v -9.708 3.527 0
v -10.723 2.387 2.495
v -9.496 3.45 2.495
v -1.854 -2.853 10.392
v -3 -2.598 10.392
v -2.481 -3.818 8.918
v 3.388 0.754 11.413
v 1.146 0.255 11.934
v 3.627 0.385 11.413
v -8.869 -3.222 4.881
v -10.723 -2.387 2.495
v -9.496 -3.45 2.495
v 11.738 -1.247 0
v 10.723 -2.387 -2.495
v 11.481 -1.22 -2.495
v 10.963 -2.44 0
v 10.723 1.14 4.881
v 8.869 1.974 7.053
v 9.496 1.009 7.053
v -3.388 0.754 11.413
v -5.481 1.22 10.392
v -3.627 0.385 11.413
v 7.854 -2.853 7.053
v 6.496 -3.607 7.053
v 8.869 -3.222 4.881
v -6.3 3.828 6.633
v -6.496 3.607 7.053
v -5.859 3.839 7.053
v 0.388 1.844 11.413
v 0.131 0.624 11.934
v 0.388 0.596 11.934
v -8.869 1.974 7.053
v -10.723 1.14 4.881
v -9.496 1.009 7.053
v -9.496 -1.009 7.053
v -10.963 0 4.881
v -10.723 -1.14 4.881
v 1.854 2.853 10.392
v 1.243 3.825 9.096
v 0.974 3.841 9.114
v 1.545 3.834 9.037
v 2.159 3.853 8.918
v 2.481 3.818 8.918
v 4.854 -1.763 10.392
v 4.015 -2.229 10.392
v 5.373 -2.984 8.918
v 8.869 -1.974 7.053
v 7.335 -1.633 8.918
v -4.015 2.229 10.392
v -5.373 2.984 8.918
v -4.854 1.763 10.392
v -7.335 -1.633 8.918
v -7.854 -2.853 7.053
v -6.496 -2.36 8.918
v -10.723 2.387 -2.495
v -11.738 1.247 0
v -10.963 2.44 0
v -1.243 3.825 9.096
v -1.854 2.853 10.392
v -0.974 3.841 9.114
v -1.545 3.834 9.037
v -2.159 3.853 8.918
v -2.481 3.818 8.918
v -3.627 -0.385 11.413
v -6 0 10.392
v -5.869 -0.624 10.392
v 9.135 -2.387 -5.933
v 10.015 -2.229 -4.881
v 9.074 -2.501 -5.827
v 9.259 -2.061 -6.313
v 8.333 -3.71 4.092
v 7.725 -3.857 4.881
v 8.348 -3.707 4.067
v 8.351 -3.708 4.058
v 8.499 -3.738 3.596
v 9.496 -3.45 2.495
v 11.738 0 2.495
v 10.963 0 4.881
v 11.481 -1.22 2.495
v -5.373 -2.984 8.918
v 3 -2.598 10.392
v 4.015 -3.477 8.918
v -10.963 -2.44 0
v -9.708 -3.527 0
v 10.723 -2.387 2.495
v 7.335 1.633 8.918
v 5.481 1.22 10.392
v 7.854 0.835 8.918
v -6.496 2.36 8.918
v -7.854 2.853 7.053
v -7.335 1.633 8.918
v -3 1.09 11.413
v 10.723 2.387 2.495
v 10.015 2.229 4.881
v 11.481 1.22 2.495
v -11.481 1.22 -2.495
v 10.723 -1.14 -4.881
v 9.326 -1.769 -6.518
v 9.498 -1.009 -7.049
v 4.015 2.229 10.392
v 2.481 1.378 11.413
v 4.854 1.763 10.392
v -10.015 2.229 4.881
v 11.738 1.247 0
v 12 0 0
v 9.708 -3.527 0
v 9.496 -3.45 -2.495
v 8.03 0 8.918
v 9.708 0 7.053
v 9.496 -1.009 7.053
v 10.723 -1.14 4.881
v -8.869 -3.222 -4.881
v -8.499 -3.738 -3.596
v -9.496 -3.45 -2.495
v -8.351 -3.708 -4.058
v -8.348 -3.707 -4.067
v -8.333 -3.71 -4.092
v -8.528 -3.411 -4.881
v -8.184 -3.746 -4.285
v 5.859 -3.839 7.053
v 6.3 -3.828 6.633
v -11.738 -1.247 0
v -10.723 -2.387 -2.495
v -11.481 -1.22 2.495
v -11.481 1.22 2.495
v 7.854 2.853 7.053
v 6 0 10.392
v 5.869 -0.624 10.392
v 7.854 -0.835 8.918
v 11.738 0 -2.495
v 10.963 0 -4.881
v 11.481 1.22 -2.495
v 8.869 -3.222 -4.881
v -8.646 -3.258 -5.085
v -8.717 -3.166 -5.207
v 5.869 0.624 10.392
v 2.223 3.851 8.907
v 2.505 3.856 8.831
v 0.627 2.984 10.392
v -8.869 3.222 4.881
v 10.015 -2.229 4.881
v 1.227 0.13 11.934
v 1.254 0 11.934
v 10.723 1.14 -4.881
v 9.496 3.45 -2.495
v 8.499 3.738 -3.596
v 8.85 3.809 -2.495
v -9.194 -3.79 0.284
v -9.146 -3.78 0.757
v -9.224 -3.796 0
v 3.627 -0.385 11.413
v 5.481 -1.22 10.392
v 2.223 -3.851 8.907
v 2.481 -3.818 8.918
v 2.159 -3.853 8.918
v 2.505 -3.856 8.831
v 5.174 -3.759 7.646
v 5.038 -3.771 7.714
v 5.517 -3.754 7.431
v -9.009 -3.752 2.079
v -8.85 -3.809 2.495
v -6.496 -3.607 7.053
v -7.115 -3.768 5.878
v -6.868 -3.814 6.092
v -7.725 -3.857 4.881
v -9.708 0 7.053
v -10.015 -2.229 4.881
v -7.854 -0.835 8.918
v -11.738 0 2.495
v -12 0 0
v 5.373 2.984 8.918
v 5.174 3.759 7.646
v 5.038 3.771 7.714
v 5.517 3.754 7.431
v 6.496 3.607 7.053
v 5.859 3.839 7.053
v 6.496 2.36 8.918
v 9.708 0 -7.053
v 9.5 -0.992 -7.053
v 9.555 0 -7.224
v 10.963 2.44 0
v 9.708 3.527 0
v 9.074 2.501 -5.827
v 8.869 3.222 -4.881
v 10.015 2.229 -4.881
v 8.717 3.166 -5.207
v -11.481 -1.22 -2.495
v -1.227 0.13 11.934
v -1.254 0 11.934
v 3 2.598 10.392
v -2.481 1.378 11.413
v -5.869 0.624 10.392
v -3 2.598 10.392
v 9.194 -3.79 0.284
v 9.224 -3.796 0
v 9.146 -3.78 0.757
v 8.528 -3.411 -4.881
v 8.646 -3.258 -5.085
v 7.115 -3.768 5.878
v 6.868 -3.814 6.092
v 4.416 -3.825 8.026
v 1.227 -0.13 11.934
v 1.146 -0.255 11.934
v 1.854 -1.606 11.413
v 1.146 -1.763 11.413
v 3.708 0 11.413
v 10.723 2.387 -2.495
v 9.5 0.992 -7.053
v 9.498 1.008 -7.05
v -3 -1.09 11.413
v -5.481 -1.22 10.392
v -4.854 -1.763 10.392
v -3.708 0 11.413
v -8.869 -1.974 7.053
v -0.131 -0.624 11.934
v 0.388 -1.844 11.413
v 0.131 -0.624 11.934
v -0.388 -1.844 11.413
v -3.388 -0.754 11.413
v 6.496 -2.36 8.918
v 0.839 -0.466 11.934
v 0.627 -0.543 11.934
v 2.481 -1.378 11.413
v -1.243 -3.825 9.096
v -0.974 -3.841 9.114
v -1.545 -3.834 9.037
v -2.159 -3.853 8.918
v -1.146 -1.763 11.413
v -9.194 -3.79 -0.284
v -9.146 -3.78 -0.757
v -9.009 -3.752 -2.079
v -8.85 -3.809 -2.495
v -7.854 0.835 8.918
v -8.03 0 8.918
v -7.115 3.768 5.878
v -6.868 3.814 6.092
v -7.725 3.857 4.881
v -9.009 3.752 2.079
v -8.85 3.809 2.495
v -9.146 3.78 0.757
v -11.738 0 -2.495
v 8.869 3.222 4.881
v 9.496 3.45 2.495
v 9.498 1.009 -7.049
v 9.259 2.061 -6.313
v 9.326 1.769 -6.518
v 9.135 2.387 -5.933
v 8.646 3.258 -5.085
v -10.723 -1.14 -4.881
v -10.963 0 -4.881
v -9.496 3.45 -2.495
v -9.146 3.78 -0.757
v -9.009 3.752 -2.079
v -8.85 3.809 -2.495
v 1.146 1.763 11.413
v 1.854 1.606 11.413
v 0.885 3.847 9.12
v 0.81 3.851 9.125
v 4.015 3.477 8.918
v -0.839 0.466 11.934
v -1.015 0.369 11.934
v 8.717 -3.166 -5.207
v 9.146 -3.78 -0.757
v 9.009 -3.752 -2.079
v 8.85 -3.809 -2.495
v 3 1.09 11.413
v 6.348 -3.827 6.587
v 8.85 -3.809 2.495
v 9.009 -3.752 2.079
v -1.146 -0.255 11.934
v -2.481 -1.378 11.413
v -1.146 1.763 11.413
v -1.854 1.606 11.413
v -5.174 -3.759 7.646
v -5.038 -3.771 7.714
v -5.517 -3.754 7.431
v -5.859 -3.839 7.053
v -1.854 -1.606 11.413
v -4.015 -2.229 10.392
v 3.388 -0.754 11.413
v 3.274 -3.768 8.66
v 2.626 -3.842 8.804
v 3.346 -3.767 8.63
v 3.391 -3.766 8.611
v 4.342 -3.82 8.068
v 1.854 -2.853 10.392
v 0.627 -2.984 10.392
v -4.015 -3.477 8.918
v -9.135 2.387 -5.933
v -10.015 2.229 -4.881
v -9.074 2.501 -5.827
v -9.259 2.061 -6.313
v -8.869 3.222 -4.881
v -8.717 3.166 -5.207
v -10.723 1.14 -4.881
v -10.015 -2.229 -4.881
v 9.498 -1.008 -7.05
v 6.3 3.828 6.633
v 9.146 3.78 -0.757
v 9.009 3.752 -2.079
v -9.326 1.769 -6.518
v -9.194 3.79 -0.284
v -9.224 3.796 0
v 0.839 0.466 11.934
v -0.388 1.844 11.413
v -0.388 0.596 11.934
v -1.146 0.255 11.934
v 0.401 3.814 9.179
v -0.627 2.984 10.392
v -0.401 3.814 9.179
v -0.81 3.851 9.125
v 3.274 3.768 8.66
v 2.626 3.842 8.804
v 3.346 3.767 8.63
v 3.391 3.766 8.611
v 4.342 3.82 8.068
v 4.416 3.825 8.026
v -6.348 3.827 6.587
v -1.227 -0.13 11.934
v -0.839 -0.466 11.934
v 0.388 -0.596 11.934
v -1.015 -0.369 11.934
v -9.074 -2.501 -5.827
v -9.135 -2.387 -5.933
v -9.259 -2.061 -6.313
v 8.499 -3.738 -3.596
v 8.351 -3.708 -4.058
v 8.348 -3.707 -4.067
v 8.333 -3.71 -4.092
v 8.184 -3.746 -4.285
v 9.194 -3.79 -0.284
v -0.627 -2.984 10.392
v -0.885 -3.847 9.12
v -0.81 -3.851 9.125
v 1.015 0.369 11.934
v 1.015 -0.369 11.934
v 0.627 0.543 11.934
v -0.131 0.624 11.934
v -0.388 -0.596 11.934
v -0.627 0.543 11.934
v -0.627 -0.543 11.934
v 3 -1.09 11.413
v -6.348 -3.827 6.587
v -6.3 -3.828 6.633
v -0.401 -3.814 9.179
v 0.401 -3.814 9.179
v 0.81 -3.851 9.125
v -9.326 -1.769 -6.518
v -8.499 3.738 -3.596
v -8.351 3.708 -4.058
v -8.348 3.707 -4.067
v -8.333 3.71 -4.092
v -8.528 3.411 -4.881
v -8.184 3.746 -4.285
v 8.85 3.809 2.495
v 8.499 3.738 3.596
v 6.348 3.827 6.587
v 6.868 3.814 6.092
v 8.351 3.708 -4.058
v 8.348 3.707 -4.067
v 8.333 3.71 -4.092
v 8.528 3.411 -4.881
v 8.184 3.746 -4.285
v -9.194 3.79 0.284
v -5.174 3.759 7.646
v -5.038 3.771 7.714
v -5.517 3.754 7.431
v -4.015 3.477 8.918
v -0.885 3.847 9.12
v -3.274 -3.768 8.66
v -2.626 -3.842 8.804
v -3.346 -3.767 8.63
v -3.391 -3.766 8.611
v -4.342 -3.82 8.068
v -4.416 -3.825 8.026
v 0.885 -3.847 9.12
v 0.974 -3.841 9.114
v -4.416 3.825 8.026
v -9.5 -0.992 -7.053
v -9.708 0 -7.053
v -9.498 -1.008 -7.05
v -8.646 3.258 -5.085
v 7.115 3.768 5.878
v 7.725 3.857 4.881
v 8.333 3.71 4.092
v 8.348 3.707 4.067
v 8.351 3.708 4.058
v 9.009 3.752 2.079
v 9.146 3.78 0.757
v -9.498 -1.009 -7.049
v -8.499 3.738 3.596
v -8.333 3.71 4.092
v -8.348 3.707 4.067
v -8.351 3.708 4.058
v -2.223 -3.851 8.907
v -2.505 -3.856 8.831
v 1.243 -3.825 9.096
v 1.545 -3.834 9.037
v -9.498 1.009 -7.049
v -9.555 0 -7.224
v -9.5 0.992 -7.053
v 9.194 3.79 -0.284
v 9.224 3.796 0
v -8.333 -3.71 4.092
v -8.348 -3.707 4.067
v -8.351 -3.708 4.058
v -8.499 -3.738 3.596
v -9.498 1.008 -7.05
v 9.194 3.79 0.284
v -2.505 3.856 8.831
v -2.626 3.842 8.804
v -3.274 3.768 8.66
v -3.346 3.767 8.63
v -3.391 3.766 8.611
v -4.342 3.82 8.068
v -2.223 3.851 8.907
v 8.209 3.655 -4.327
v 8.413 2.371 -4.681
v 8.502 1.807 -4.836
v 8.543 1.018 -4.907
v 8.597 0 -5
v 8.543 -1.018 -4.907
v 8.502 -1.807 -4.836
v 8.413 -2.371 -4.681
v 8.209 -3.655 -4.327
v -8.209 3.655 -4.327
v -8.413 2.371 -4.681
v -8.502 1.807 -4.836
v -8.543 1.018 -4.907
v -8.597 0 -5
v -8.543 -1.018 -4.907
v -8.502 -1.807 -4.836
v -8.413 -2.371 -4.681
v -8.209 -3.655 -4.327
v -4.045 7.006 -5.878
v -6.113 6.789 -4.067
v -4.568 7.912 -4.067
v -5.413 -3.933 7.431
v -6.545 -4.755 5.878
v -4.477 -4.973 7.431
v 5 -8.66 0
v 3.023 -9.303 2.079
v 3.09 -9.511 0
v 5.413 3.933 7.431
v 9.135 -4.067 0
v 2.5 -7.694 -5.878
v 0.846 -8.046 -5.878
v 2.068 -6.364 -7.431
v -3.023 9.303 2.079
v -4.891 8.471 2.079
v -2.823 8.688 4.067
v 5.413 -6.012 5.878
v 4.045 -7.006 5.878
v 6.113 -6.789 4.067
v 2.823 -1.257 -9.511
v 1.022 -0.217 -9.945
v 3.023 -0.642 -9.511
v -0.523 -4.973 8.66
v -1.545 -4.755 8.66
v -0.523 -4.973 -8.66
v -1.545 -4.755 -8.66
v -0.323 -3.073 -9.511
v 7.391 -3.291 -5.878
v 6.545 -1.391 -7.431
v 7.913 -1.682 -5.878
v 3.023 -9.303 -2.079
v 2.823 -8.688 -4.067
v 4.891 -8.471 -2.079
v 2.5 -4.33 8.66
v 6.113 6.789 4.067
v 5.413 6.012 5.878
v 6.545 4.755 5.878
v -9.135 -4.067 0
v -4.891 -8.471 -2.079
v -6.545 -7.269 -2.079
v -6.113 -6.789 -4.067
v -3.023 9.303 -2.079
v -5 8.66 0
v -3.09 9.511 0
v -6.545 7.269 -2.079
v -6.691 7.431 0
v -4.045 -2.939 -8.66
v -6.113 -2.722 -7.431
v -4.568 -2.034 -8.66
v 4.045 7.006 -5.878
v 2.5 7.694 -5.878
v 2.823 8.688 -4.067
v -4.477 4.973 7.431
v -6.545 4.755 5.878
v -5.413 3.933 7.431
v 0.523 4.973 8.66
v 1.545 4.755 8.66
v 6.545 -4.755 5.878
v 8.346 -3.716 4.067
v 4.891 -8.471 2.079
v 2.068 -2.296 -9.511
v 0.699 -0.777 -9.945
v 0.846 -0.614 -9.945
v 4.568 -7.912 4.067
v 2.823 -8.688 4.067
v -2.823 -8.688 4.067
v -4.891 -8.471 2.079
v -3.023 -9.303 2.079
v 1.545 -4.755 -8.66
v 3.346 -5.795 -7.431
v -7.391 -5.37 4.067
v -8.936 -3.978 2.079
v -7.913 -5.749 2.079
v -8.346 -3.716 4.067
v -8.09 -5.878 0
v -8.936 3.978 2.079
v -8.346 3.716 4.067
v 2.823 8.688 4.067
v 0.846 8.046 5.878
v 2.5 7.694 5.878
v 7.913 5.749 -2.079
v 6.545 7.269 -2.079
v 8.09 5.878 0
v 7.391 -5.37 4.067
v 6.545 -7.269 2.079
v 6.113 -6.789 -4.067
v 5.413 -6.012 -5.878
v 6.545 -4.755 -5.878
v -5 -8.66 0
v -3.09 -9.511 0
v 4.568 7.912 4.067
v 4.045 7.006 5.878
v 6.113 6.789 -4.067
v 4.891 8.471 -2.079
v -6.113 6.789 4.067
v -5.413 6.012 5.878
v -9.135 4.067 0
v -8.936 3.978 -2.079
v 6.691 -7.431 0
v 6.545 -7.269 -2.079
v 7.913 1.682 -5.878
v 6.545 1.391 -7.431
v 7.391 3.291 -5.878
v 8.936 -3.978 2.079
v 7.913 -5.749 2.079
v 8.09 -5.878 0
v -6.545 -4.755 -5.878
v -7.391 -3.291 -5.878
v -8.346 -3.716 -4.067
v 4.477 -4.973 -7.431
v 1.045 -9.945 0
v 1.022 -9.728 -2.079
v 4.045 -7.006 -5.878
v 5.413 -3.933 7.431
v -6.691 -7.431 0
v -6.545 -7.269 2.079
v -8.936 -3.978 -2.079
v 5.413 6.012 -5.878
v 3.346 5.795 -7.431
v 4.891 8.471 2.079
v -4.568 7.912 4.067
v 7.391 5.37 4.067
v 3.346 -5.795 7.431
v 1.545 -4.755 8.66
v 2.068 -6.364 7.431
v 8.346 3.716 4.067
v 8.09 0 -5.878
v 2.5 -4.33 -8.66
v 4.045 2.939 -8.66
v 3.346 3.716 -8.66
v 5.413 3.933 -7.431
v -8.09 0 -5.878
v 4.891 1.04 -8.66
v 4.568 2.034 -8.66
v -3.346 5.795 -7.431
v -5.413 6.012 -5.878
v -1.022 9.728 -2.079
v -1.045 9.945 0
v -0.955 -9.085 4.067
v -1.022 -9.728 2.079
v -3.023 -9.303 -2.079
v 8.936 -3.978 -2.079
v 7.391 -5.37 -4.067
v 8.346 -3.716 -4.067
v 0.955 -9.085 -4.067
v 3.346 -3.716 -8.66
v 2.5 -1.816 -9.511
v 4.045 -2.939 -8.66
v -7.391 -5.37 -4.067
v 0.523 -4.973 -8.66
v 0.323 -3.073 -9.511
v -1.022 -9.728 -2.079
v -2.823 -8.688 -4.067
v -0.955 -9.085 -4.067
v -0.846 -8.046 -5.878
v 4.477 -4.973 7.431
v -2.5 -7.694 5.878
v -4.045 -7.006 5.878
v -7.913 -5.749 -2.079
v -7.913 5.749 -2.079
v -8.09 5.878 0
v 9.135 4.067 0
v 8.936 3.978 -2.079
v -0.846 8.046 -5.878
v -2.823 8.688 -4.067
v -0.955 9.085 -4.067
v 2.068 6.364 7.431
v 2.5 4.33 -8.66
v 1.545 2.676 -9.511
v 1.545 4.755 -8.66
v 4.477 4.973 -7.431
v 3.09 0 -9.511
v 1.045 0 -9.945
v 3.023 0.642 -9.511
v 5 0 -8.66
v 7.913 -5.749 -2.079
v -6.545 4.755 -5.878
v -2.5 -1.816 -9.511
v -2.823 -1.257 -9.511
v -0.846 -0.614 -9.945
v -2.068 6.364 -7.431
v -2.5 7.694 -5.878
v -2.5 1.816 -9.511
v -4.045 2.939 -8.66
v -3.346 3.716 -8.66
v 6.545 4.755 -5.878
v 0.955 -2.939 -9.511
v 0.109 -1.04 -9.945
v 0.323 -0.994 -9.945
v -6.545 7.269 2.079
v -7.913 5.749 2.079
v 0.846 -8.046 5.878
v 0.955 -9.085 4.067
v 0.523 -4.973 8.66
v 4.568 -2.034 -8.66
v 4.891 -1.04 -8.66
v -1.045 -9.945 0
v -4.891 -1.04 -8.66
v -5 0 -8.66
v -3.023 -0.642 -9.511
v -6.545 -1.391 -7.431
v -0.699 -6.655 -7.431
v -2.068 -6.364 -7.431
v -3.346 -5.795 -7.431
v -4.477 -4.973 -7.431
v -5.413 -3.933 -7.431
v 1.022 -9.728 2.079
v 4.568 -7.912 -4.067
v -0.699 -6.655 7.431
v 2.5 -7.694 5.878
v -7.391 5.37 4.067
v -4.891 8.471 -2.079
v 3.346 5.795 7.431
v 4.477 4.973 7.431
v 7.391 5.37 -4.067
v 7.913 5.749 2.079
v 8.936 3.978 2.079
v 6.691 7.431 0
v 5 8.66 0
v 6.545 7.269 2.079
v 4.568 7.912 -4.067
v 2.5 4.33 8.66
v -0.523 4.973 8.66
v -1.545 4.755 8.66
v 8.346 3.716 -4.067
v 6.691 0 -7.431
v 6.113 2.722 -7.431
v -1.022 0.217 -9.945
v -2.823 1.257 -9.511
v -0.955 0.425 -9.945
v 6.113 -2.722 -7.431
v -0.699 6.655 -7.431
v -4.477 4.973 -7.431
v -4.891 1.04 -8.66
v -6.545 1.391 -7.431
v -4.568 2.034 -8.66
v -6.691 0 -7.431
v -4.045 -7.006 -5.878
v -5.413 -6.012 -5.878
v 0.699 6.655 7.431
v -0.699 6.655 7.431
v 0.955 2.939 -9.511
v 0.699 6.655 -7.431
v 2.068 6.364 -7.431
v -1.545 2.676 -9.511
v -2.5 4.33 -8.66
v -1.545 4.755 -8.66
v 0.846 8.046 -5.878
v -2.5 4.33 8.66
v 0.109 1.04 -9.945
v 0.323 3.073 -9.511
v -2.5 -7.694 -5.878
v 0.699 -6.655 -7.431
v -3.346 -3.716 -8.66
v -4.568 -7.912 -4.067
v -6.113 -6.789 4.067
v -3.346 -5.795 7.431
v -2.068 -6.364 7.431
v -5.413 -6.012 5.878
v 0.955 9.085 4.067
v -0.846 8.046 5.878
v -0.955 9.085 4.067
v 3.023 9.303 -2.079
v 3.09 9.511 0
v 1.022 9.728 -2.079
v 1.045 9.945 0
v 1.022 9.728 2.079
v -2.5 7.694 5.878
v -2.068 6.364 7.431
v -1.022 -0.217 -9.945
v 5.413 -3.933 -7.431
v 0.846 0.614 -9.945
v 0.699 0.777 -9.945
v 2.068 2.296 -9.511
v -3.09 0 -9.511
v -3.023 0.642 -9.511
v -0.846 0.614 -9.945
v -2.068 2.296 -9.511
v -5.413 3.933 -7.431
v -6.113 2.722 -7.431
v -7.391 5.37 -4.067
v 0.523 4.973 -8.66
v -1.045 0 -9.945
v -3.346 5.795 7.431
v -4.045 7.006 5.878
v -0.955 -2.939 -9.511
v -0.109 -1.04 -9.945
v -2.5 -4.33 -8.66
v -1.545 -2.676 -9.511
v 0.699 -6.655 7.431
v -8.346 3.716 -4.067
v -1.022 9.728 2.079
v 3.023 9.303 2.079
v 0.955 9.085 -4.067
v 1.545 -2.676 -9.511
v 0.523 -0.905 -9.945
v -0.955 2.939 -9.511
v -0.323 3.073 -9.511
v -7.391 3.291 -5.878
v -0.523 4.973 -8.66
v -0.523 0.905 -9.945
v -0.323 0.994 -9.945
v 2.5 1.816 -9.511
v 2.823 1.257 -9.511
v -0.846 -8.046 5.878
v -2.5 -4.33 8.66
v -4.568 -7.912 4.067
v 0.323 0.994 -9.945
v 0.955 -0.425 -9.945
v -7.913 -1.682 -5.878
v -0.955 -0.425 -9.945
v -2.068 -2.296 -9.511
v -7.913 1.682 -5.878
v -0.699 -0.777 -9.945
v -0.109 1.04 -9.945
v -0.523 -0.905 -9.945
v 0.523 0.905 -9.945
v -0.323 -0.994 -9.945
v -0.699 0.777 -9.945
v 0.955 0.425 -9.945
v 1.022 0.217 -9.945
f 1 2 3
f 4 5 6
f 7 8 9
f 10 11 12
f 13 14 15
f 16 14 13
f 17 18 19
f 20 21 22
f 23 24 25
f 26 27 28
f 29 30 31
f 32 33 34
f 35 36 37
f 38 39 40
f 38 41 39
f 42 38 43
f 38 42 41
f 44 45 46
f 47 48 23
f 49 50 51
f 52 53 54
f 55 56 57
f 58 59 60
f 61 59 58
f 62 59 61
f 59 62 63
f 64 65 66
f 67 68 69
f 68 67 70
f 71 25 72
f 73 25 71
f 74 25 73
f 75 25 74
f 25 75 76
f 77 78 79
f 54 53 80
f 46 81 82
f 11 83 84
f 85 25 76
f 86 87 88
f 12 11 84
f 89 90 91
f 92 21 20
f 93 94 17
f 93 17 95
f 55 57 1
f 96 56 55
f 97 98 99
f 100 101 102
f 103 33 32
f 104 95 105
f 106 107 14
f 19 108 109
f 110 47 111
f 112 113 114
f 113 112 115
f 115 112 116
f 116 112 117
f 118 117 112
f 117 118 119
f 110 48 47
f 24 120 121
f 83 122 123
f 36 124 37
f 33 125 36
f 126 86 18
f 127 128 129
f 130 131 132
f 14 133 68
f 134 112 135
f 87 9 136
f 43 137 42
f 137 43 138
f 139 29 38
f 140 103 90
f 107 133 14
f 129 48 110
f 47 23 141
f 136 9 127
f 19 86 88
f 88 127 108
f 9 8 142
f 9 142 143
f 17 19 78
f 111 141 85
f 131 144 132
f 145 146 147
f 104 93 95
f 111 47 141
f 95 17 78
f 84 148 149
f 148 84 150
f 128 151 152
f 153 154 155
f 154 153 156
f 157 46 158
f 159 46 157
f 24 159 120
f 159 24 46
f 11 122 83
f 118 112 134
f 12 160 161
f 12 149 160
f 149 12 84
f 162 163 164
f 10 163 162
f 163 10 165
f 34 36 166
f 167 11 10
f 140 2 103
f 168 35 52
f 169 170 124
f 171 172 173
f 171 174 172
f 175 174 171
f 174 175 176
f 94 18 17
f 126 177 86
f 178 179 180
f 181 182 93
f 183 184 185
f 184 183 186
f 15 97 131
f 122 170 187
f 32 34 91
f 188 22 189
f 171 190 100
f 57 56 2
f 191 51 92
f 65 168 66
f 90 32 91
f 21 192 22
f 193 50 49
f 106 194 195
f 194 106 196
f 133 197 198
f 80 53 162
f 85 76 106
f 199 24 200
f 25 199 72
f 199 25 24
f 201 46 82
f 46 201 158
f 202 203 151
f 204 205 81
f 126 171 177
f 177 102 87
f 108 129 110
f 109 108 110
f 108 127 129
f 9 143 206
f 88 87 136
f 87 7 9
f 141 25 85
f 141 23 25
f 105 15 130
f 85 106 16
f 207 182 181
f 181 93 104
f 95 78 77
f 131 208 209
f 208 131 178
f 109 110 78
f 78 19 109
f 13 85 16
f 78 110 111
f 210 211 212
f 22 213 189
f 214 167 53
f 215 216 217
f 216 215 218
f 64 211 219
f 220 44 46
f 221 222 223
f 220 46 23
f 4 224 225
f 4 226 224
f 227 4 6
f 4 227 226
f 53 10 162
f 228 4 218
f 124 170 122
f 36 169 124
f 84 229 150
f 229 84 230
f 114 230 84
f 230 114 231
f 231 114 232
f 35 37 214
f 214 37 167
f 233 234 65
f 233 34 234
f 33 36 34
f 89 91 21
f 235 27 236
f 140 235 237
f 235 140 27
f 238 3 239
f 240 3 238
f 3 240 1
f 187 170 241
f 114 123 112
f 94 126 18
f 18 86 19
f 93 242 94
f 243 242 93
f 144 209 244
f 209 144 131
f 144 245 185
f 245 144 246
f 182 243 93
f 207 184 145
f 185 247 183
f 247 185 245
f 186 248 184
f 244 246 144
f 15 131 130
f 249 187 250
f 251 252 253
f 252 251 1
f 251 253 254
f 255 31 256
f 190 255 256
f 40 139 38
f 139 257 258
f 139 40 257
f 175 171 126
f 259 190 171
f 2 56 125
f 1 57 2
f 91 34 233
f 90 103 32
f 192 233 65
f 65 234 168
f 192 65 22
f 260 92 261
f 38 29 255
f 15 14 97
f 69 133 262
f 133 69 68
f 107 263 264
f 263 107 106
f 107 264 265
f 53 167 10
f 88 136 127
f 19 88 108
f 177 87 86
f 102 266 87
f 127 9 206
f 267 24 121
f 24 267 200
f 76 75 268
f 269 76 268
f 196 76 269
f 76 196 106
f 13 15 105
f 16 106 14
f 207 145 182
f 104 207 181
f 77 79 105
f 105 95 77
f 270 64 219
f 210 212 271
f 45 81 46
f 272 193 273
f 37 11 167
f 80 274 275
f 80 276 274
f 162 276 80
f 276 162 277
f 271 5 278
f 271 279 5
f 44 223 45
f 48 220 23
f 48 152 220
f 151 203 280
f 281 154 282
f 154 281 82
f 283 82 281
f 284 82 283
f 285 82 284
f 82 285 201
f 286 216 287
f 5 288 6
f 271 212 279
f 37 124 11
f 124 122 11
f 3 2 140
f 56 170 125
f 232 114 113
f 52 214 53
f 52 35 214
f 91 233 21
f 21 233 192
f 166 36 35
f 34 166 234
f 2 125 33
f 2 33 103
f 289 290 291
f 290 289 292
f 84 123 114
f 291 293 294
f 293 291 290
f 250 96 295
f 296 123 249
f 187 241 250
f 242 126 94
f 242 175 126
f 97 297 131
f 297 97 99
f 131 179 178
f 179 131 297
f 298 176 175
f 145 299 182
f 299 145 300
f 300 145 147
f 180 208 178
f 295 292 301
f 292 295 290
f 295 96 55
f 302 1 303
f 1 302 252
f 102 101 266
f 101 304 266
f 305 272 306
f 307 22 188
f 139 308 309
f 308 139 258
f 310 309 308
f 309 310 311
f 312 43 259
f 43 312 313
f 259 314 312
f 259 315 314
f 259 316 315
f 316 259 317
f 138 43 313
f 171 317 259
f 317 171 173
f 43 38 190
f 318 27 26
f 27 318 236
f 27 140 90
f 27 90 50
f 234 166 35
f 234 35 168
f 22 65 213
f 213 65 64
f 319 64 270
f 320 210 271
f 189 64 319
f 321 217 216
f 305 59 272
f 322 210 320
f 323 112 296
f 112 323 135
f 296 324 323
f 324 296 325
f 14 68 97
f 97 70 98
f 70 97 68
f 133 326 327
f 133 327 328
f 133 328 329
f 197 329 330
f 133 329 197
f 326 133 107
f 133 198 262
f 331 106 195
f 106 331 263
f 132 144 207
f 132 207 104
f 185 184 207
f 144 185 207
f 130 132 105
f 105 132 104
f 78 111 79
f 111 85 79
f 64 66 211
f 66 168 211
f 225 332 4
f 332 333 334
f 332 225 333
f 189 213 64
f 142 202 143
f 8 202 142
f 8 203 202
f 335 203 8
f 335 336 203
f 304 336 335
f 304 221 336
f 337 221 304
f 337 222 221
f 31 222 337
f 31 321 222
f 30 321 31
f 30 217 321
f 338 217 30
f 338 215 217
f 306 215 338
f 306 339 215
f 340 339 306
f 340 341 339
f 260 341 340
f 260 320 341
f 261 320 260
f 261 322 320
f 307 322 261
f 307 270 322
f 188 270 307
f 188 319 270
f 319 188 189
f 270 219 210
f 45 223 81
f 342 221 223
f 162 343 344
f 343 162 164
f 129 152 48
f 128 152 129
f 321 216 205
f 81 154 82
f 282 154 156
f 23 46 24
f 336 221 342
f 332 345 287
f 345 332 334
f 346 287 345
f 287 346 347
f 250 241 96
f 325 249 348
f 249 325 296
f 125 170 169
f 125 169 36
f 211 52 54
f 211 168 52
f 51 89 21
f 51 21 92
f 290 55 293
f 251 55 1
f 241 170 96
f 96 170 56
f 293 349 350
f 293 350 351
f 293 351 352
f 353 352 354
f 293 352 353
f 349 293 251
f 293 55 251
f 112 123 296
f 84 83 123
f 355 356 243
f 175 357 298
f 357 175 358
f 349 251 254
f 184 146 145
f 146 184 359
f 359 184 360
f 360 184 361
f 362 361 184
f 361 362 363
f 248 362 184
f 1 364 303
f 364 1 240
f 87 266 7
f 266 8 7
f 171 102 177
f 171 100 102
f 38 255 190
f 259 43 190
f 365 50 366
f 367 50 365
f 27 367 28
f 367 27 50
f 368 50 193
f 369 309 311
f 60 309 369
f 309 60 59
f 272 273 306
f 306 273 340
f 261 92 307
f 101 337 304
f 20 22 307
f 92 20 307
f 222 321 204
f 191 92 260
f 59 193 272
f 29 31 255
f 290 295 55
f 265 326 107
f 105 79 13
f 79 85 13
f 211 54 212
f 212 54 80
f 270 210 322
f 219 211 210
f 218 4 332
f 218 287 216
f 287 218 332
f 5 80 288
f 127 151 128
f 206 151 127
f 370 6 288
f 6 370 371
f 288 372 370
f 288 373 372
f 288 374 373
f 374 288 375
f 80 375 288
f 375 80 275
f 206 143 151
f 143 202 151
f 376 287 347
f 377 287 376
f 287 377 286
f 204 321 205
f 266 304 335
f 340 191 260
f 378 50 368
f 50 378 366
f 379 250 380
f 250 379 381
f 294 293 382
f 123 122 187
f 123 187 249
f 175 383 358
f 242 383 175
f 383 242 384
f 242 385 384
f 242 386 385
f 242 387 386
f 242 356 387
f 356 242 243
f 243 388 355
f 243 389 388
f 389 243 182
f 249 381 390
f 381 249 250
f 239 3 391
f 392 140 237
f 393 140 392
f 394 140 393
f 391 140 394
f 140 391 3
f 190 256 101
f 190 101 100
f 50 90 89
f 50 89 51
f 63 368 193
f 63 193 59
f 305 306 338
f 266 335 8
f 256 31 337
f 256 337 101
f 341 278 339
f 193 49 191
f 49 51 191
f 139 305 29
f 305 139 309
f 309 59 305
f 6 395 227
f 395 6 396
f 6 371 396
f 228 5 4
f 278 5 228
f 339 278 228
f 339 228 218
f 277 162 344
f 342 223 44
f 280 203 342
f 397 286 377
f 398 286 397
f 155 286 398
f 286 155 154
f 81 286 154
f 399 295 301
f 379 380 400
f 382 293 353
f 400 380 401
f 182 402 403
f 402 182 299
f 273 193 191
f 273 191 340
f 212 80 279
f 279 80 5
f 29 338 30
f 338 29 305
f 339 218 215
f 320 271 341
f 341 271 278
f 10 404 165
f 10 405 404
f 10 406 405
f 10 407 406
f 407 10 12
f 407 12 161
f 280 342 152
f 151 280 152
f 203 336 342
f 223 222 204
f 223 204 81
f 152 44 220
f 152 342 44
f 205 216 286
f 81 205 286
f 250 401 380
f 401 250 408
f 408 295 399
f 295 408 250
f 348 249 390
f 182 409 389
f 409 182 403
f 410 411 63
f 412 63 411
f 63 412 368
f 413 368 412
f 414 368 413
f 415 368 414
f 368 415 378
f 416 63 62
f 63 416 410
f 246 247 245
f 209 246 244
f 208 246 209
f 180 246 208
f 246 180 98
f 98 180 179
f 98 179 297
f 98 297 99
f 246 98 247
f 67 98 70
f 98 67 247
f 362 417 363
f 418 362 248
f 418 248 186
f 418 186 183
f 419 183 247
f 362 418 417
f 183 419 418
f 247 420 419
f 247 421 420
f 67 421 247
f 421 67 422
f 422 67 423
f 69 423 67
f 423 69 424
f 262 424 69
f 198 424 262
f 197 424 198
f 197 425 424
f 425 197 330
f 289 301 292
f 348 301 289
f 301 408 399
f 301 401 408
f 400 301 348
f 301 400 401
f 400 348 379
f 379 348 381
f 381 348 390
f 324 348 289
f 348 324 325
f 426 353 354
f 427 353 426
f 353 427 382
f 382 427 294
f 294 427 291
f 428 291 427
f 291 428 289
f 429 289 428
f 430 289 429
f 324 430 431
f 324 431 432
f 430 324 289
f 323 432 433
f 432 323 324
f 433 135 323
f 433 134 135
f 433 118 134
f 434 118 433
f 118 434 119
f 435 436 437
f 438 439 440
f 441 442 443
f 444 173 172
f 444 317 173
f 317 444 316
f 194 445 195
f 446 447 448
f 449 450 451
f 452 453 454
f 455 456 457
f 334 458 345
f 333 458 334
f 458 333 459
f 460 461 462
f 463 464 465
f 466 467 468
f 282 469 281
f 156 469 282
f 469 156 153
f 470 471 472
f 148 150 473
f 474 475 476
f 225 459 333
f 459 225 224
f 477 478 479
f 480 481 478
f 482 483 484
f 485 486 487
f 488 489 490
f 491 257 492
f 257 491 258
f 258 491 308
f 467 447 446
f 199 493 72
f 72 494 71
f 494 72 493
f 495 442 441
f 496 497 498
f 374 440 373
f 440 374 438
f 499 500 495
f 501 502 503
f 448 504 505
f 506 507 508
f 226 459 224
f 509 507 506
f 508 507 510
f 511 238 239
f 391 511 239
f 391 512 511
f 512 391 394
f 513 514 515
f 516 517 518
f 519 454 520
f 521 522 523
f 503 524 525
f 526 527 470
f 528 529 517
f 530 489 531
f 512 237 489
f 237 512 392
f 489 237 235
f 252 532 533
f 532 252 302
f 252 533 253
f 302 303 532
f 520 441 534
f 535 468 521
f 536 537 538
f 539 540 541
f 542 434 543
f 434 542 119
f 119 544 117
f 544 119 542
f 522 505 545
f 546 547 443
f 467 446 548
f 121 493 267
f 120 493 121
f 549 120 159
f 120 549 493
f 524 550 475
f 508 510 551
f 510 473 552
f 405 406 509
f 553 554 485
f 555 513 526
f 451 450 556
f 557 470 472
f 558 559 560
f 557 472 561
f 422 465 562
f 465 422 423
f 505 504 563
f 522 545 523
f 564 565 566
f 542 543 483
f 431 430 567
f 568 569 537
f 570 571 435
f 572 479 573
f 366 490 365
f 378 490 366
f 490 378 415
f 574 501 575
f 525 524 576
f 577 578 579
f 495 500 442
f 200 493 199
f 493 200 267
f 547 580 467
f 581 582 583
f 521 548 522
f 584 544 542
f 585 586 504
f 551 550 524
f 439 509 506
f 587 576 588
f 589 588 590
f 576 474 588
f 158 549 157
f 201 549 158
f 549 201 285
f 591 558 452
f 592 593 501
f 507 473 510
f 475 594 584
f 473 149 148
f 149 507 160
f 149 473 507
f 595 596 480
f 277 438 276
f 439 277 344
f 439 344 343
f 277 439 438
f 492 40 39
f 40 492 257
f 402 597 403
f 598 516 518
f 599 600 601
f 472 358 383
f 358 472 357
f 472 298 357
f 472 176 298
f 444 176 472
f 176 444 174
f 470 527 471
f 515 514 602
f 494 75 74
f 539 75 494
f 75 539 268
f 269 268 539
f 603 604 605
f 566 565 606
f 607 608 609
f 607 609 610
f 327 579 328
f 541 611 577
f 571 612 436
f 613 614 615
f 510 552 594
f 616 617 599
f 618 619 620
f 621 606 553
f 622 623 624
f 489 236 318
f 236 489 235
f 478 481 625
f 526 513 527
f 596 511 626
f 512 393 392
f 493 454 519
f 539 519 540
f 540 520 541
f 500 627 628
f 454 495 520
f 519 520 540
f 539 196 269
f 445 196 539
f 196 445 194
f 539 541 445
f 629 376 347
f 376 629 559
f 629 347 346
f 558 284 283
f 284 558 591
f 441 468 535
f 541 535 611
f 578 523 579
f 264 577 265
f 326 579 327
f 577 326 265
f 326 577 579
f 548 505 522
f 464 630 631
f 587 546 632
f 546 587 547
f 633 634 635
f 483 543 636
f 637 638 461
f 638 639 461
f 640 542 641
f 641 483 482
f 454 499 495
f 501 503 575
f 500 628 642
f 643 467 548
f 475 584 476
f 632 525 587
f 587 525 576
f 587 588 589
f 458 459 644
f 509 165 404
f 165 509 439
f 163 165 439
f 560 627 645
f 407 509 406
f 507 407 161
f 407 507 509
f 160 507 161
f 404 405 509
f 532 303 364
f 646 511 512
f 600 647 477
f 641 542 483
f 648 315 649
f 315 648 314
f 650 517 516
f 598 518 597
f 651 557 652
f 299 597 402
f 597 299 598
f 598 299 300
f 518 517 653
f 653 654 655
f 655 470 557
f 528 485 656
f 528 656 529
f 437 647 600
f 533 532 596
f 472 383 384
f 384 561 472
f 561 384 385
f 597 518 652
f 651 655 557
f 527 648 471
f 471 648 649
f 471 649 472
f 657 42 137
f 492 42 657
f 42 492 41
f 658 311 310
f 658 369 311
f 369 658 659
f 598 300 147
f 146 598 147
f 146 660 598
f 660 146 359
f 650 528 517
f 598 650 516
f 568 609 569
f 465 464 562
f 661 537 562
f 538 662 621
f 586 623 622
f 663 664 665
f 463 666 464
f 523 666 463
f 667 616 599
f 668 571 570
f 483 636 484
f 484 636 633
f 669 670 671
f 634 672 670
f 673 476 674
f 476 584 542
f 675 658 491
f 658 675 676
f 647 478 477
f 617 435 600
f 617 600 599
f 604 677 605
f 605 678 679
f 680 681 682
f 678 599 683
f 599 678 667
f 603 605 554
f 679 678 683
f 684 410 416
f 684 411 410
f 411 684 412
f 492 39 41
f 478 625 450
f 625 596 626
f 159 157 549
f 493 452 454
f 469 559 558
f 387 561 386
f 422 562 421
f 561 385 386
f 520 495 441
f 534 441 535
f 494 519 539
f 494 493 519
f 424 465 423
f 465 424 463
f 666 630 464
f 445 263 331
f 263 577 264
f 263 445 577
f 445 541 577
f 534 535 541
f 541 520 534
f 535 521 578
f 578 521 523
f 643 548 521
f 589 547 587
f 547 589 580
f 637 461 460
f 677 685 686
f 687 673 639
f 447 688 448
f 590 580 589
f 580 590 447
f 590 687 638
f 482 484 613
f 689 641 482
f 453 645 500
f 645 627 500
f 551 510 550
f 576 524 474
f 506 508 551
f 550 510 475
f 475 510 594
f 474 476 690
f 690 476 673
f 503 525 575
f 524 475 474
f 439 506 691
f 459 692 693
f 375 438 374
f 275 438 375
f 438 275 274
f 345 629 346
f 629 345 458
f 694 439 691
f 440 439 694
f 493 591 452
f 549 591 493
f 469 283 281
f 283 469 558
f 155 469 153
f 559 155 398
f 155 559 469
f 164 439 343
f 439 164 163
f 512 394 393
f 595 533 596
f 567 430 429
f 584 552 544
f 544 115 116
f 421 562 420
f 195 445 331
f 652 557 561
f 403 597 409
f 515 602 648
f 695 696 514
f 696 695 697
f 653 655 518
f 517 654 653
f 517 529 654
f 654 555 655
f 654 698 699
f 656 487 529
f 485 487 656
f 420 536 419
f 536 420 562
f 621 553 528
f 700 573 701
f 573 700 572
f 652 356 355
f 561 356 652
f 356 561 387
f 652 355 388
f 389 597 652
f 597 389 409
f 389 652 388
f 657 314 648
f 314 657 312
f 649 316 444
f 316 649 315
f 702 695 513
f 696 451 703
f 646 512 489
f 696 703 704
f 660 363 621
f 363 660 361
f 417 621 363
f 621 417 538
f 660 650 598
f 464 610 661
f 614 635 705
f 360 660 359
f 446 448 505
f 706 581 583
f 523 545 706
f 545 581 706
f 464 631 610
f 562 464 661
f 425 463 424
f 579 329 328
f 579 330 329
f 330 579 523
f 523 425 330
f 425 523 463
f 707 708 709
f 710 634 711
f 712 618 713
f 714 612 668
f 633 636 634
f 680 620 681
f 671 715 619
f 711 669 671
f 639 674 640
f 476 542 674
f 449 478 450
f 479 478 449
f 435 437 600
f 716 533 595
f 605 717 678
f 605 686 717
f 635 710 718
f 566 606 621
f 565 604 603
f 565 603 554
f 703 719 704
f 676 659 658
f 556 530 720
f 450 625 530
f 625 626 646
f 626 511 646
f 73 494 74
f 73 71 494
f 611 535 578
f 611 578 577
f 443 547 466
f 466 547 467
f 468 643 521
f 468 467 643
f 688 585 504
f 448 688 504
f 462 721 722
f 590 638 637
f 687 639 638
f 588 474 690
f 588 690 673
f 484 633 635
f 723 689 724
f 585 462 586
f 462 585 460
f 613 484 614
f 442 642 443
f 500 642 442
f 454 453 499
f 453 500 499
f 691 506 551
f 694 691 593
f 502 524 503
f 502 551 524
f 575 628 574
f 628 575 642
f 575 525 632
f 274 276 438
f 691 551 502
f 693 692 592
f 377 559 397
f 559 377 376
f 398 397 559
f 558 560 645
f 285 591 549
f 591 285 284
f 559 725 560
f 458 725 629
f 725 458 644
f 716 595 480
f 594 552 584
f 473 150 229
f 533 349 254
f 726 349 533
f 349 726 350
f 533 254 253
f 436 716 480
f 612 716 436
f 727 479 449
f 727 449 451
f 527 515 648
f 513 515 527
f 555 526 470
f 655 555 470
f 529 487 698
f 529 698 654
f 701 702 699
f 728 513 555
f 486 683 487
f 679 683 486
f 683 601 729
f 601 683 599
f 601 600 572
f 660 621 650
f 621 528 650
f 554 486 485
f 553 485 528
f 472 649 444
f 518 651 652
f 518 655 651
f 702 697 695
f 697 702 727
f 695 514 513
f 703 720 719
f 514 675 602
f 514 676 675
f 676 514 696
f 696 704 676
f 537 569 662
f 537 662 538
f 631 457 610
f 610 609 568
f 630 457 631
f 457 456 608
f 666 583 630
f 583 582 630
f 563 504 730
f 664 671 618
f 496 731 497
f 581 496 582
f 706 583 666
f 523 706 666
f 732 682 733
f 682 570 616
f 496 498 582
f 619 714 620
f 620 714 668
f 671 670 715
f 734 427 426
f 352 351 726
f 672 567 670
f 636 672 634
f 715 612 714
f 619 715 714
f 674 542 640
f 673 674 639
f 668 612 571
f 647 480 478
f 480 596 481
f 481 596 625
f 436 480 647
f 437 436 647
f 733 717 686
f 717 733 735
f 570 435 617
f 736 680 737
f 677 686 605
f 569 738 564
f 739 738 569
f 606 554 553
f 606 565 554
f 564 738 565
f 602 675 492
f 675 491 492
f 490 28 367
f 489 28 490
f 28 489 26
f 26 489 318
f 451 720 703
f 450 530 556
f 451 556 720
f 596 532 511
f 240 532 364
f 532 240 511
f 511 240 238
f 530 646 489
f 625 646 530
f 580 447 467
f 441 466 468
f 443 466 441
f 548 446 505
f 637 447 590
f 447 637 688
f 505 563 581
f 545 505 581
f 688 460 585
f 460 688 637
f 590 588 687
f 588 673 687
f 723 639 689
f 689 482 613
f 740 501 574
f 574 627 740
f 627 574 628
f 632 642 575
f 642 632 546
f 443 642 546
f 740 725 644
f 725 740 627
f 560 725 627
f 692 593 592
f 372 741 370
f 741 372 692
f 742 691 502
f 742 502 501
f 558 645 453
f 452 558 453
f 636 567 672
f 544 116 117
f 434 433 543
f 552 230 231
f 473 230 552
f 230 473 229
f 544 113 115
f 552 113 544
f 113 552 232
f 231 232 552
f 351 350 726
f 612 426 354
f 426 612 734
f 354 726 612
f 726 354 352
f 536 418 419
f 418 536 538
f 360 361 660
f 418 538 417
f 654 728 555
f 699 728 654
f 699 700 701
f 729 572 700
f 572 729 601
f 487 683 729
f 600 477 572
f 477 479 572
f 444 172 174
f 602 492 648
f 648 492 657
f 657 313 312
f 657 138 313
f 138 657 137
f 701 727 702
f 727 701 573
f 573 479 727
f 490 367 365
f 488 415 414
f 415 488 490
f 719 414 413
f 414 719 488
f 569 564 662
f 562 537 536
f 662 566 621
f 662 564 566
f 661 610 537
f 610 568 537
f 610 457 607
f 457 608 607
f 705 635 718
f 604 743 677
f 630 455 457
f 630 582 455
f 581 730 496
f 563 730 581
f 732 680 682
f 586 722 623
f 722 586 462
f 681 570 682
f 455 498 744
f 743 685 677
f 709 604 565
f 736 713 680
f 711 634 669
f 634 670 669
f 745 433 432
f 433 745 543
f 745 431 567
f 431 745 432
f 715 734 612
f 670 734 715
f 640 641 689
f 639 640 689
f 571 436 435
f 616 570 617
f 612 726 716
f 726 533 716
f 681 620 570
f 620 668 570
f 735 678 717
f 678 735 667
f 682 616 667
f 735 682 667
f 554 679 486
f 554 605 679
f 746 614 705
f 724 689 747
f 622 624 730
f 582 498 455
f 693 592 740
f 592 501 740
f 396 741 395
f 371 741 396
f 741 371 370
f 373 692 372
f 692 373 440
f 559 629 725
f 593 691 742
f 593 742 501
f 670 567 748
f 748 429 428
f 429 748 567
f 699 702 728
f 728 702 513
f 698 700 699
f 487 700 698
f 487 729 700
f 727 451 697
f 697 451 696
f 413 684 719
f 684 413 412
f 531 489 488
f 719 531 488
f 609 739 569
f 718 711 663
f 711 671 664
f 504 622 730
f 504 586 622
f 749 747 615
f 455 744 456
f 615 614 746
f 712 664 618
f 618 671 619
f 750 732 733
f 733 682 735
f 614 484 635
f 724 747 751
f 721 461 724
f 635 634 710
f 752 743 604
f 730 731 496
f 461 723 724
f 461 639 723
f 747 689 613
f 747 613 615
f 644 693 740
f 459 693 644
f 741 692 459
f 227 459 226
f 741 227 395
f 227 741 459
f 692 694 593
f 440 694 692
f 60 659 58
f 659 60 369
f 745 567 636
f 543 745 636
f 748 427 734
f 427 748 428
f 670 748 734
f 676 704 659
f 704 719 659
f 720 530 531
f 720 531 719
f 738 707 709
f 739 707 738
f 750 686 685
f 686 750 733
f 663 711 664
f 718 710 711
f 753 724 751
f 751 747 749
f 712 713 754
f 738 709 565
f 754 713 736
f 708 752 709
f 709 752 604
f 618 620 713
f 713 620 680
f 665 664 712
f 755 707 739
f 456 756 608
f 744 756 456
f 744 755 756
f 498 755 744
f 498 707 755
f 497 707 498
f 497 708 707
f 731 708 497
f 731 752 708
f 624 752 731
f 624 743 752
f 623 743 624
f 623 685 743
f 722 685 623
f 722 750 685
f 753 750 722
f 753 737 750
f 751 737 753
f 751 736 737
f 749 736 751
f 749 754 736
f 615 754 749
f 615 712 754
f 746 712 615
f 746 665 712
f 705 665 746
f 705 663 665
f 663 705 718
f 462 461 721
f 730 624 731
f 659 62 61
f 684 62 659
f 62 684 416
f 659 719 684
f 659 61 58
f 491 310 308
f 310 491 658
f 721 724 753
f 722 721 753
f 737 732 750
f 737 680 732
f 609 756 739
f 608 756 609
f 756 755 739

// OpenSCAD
color("black")
    difference() {
        scale([1, .5, 1])
            sphere(r = 12);
        translate([0, 0, - 10])
            rotate([90,0,0])
                cylinder(h = 20, r = 10, center = true);
    }

# sphere(r = 10);
